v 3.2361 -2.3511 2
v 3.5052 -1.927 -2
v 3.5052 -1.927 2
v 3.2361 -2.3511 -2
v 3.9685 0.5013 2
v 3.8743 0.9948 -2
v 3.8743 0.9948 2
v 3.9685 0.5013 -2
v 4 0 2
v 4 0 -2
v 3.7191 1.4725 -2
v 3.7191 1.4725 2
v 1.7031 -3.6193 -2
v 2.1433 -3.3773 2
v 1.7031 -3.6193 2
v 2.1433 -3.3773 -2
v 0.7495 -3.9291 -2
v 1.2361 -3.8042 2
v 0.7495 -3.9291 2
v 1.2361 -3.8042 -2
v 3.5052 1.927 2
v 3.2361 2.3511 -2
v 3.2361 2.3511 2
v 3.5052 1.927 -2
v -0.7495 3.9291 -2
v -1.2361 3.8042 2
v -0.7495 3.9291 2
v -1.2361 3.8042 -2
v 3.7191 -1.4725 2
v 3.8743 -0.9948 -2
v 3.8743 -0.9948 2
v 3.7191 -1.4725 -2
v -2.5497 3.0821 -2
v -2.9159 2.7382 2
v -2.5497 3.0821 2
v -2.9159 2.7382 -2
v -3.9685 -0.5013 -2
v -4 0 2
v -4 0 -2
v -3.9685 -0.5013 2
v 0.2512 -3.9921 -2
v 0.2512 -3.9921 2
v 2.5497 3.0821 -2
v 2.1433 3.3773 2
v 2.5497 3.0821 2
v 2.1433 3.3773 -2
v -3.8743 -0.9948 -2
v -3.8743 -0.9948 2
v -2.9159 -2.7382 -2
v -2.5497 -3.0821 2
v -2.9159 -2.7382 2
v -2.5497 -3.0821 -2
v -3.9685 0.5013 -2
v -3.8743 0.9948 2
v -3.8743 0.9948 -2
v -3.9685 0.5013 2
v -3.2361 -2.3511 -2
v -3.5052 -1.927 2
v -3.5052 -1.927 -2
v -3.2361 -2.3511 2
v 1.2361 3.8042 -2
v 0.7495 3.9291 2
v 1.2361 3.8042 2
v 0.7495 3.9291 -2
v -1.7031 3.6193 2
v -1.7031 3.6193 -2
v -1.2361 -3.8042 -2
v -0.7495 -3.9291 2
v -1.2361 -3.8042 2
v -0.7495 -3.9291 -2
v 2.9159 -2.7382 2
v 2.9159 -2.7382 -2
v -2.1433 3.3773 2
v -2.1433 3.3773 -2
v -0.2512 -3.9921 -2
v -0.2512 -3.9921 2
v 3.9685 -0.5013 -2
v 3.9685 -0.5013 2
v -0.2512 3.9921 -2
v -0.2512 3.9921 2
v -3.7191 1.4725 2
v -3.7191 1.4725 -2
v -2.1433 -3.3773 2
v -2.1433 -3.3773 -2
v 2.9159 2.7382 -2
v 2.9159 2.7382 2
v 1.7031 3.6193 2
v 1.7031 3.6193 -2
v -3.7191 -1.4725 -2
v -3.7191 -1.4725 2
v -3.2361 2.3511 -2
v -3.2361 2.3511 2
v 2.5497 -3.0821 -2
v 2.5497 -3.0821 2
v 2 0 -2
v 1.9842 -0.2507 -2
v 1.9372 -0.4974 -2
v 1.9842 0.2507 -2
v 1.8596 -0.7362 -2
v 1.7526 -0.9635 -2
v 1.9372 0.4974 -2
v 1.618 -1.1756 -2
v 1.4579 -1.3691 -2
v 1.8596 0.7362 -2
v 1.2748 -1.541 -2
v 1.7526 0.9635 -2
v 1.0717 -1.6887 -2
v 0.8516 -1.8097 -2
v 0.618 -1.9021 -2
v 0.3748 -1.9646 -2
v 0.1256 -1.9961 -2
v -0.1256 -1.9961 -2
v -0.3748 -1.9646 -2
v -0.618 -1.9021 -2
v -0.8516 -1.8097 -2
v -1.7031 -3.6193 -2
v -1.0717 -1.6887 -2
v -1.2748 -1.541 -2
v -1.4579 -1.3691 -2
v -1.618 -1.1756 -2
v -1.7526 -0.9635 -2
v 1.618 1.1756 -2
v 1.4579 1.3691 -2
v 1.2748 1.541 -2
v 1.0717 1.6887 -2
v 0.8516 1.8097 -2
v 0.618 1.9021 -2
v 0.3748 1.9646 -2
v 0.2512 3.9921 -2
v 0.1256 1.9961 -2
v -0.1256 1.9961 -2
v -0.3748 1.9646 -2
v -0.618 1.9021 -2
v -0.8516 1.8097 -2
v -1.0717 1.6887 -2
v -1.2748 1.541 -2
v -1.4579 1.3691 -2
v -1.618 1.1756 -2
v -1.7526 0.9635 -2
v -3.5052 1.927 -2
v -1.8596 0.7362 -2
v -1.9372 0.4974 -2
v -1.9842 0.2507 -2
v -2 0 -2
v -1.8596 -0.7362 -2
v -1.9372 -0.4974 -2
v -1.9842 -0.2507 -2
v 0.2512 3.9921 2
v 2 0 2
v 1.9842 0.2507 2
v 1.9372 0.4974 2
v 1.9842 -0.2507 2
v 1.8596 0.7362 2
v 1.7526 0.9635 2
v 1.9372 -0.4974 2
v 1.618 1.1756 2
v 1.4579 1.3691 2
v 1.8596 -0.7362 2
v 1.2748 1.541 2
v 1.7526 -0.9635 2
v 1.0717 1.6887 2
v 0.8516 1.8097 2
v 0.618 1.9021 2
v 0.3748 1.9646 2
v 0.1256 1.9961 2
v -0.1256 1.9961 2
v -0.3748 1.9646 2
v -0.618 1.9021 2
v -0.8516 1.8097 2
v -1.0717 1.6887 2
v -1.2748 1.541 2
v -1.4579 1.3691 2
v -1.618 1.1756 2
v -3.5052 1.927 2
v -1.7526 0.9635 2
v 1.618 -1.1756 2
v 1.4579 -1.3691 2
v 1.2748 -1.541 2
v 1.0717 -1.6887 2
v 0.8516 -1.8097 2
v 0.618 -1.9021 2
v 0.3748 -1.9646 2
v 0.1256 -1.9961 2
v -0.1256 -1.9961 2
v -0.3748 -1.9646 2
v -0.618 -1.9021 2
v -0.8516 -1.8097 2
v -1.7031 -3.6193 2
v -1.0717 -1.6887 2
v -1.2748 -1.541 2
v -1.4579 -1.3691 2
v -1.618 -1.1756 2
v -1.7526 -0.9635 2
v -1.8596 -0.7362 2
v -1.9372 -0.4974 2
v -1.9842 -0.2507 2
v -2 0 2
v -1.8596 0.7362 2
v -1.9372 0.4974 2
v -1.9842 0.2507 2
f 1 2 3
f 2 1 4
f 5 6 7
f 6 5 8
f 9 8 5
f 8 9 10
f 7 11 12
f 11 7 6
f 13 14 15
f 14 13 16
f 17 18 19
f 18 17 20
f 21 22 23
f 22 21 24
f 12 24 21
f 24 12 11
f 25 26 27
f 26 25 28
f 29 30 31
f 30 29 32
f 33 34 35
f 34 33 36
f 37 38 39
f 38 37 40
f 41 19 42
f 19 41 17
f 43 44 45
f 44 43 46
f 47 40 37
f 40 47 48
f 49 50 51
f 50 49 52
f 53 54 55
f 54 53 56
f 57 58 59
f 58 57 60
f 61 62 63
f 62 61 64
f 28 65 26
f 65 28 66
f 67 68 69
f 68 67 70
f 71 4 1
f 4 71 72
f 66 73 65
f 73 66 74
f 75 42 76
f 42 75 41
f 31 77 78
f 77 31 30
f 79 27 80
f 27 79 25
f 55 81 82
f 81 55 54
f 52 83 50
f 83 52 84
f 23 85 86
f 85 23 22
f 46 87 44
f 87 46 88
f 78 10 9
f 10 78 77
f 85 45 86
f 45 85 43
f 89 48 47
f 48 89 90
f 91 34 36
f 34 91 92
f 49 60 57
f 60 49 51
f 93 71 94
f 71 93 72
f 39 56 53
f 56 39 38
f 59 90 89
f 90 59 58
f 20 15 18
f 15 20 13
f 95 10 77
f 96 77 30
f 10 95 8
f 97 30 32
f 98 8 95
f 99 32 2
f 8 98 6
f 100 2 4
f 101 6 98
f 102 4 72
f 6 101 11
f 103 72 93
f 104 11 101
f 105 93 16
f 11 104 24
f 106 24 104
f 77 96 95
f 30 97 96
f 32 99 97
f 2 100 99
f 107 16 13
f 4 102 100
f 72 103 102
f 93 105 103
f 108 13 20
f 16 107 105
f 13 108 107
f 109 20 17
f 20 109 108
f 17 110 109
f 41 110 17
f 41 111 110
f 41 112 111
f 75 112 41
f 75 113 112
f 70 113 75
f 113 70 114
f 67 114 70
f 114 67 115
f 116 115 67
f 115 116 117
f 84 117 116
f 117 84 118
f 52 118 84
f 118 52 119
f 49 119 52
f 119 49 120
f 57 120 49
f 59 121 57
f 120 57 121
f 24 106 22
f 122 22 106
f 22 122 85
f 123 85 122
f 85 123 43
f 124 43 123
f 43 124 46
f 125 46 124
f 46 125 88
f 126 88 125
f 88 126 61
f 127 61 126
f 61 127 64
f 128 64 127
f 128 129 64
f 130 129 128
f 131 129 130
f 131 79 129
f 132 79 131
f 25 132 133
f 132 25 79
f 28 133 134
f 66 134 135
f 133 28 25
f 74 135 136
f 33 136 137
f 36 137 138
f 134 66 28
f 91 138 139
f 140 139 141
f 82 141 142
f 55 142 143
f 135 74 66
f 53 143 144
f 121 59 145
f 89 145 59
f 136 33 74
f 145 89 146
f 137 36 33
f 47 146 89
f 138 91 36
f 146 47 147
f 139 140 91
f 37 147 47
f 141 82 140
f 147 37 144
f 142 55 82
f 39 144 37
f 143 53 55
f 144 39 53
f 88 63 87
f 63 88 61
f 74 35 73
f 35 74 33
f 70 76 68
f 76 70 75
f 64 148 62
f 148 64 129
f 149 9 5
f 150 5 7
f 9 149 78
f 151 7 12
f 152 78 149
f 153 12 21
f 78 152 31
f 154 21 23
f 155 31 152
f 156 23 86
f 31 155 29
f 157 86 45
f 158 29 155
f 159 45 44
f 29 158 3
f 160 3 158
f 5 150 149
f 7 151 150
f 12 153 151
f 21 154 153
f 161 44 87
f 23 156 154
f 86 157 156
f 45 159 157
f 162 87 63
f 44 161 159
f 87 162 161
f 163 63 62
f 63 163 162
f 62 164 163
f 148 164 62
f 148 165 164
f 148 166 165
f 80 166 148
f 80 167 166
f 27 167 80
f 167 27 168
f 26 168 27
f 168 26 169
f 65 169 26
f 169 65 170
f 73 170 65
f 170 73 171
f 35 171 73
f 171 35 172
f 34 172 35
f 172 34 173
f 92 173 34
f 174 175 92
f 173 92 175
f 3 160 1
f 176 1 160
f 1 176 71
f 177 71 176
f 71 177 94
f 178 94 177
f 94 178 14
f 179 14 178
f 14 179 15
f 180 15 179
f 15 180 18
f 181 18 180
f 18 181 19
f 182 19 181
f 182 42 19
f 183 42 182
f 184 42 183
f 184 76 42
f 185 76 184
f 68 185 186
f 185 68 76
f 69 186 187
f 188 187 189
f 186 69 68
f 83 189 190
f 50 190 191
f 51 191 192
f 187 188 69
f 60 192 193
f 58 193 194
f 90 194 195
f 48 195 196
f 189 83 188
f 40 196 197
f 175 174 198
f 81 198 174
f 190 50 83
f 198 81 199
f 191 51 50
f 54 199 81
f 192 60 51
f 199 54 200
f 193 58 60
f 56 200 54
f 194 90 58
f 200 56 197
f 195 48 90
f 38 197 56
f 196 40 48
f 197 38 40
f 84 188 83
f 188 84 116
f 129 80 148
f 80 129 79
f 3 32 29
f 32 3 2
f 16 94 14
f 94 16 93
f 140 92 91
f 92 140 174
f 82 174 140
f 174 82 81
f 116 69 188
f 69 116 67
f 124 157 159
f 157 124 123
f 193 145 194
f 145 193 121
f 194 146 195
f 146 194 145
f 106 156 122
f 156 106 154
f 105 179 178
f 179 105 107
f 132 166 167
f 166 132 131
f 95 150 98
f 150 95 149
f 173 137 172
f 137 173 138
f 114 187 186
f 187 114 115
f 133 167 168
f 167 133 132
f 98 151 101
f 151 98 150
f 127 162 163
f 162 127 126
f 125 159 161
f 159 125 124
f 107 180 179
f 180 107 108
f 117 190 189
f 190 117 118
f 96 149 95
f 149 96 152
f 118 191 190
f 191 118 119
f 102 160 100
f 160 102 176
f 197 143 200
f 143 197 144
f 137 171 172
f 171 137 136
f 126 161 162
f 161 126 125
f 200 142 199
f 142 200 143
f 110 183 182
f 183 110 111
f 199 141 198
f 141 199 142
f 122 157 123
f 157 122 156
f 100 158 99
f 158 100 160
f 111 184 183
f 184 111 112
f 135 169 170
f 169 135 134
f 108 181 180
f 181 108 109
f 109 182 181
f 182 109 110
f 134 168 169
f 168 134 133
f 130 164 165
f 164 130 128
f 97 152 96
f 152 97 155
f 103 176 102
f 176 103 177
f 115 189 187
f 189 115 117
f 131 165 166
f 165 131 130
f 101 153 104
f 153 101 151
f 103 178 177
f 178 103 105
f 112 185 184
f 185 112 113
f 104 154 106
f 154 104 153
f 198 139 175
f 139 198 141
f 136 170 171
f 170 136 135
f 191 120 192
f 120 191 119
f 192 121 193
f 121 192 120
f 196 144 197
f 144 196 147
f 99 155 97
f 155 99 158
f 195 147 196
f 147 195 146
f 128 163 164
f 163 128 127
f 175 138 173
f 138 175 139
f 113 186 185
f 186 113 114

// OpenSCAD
$fn = 50;


difference() {
	union() {
		translate(v = [0, 0, -2.0000000000]) {
			cylinder(h = 4, r = 4.0000000000);
		}
	}
	union() {
		translate(v = [0, 0, -100.0000000000]) {
			cylinder(h = 200, r = 2.0000000000);
		}
	}
}
